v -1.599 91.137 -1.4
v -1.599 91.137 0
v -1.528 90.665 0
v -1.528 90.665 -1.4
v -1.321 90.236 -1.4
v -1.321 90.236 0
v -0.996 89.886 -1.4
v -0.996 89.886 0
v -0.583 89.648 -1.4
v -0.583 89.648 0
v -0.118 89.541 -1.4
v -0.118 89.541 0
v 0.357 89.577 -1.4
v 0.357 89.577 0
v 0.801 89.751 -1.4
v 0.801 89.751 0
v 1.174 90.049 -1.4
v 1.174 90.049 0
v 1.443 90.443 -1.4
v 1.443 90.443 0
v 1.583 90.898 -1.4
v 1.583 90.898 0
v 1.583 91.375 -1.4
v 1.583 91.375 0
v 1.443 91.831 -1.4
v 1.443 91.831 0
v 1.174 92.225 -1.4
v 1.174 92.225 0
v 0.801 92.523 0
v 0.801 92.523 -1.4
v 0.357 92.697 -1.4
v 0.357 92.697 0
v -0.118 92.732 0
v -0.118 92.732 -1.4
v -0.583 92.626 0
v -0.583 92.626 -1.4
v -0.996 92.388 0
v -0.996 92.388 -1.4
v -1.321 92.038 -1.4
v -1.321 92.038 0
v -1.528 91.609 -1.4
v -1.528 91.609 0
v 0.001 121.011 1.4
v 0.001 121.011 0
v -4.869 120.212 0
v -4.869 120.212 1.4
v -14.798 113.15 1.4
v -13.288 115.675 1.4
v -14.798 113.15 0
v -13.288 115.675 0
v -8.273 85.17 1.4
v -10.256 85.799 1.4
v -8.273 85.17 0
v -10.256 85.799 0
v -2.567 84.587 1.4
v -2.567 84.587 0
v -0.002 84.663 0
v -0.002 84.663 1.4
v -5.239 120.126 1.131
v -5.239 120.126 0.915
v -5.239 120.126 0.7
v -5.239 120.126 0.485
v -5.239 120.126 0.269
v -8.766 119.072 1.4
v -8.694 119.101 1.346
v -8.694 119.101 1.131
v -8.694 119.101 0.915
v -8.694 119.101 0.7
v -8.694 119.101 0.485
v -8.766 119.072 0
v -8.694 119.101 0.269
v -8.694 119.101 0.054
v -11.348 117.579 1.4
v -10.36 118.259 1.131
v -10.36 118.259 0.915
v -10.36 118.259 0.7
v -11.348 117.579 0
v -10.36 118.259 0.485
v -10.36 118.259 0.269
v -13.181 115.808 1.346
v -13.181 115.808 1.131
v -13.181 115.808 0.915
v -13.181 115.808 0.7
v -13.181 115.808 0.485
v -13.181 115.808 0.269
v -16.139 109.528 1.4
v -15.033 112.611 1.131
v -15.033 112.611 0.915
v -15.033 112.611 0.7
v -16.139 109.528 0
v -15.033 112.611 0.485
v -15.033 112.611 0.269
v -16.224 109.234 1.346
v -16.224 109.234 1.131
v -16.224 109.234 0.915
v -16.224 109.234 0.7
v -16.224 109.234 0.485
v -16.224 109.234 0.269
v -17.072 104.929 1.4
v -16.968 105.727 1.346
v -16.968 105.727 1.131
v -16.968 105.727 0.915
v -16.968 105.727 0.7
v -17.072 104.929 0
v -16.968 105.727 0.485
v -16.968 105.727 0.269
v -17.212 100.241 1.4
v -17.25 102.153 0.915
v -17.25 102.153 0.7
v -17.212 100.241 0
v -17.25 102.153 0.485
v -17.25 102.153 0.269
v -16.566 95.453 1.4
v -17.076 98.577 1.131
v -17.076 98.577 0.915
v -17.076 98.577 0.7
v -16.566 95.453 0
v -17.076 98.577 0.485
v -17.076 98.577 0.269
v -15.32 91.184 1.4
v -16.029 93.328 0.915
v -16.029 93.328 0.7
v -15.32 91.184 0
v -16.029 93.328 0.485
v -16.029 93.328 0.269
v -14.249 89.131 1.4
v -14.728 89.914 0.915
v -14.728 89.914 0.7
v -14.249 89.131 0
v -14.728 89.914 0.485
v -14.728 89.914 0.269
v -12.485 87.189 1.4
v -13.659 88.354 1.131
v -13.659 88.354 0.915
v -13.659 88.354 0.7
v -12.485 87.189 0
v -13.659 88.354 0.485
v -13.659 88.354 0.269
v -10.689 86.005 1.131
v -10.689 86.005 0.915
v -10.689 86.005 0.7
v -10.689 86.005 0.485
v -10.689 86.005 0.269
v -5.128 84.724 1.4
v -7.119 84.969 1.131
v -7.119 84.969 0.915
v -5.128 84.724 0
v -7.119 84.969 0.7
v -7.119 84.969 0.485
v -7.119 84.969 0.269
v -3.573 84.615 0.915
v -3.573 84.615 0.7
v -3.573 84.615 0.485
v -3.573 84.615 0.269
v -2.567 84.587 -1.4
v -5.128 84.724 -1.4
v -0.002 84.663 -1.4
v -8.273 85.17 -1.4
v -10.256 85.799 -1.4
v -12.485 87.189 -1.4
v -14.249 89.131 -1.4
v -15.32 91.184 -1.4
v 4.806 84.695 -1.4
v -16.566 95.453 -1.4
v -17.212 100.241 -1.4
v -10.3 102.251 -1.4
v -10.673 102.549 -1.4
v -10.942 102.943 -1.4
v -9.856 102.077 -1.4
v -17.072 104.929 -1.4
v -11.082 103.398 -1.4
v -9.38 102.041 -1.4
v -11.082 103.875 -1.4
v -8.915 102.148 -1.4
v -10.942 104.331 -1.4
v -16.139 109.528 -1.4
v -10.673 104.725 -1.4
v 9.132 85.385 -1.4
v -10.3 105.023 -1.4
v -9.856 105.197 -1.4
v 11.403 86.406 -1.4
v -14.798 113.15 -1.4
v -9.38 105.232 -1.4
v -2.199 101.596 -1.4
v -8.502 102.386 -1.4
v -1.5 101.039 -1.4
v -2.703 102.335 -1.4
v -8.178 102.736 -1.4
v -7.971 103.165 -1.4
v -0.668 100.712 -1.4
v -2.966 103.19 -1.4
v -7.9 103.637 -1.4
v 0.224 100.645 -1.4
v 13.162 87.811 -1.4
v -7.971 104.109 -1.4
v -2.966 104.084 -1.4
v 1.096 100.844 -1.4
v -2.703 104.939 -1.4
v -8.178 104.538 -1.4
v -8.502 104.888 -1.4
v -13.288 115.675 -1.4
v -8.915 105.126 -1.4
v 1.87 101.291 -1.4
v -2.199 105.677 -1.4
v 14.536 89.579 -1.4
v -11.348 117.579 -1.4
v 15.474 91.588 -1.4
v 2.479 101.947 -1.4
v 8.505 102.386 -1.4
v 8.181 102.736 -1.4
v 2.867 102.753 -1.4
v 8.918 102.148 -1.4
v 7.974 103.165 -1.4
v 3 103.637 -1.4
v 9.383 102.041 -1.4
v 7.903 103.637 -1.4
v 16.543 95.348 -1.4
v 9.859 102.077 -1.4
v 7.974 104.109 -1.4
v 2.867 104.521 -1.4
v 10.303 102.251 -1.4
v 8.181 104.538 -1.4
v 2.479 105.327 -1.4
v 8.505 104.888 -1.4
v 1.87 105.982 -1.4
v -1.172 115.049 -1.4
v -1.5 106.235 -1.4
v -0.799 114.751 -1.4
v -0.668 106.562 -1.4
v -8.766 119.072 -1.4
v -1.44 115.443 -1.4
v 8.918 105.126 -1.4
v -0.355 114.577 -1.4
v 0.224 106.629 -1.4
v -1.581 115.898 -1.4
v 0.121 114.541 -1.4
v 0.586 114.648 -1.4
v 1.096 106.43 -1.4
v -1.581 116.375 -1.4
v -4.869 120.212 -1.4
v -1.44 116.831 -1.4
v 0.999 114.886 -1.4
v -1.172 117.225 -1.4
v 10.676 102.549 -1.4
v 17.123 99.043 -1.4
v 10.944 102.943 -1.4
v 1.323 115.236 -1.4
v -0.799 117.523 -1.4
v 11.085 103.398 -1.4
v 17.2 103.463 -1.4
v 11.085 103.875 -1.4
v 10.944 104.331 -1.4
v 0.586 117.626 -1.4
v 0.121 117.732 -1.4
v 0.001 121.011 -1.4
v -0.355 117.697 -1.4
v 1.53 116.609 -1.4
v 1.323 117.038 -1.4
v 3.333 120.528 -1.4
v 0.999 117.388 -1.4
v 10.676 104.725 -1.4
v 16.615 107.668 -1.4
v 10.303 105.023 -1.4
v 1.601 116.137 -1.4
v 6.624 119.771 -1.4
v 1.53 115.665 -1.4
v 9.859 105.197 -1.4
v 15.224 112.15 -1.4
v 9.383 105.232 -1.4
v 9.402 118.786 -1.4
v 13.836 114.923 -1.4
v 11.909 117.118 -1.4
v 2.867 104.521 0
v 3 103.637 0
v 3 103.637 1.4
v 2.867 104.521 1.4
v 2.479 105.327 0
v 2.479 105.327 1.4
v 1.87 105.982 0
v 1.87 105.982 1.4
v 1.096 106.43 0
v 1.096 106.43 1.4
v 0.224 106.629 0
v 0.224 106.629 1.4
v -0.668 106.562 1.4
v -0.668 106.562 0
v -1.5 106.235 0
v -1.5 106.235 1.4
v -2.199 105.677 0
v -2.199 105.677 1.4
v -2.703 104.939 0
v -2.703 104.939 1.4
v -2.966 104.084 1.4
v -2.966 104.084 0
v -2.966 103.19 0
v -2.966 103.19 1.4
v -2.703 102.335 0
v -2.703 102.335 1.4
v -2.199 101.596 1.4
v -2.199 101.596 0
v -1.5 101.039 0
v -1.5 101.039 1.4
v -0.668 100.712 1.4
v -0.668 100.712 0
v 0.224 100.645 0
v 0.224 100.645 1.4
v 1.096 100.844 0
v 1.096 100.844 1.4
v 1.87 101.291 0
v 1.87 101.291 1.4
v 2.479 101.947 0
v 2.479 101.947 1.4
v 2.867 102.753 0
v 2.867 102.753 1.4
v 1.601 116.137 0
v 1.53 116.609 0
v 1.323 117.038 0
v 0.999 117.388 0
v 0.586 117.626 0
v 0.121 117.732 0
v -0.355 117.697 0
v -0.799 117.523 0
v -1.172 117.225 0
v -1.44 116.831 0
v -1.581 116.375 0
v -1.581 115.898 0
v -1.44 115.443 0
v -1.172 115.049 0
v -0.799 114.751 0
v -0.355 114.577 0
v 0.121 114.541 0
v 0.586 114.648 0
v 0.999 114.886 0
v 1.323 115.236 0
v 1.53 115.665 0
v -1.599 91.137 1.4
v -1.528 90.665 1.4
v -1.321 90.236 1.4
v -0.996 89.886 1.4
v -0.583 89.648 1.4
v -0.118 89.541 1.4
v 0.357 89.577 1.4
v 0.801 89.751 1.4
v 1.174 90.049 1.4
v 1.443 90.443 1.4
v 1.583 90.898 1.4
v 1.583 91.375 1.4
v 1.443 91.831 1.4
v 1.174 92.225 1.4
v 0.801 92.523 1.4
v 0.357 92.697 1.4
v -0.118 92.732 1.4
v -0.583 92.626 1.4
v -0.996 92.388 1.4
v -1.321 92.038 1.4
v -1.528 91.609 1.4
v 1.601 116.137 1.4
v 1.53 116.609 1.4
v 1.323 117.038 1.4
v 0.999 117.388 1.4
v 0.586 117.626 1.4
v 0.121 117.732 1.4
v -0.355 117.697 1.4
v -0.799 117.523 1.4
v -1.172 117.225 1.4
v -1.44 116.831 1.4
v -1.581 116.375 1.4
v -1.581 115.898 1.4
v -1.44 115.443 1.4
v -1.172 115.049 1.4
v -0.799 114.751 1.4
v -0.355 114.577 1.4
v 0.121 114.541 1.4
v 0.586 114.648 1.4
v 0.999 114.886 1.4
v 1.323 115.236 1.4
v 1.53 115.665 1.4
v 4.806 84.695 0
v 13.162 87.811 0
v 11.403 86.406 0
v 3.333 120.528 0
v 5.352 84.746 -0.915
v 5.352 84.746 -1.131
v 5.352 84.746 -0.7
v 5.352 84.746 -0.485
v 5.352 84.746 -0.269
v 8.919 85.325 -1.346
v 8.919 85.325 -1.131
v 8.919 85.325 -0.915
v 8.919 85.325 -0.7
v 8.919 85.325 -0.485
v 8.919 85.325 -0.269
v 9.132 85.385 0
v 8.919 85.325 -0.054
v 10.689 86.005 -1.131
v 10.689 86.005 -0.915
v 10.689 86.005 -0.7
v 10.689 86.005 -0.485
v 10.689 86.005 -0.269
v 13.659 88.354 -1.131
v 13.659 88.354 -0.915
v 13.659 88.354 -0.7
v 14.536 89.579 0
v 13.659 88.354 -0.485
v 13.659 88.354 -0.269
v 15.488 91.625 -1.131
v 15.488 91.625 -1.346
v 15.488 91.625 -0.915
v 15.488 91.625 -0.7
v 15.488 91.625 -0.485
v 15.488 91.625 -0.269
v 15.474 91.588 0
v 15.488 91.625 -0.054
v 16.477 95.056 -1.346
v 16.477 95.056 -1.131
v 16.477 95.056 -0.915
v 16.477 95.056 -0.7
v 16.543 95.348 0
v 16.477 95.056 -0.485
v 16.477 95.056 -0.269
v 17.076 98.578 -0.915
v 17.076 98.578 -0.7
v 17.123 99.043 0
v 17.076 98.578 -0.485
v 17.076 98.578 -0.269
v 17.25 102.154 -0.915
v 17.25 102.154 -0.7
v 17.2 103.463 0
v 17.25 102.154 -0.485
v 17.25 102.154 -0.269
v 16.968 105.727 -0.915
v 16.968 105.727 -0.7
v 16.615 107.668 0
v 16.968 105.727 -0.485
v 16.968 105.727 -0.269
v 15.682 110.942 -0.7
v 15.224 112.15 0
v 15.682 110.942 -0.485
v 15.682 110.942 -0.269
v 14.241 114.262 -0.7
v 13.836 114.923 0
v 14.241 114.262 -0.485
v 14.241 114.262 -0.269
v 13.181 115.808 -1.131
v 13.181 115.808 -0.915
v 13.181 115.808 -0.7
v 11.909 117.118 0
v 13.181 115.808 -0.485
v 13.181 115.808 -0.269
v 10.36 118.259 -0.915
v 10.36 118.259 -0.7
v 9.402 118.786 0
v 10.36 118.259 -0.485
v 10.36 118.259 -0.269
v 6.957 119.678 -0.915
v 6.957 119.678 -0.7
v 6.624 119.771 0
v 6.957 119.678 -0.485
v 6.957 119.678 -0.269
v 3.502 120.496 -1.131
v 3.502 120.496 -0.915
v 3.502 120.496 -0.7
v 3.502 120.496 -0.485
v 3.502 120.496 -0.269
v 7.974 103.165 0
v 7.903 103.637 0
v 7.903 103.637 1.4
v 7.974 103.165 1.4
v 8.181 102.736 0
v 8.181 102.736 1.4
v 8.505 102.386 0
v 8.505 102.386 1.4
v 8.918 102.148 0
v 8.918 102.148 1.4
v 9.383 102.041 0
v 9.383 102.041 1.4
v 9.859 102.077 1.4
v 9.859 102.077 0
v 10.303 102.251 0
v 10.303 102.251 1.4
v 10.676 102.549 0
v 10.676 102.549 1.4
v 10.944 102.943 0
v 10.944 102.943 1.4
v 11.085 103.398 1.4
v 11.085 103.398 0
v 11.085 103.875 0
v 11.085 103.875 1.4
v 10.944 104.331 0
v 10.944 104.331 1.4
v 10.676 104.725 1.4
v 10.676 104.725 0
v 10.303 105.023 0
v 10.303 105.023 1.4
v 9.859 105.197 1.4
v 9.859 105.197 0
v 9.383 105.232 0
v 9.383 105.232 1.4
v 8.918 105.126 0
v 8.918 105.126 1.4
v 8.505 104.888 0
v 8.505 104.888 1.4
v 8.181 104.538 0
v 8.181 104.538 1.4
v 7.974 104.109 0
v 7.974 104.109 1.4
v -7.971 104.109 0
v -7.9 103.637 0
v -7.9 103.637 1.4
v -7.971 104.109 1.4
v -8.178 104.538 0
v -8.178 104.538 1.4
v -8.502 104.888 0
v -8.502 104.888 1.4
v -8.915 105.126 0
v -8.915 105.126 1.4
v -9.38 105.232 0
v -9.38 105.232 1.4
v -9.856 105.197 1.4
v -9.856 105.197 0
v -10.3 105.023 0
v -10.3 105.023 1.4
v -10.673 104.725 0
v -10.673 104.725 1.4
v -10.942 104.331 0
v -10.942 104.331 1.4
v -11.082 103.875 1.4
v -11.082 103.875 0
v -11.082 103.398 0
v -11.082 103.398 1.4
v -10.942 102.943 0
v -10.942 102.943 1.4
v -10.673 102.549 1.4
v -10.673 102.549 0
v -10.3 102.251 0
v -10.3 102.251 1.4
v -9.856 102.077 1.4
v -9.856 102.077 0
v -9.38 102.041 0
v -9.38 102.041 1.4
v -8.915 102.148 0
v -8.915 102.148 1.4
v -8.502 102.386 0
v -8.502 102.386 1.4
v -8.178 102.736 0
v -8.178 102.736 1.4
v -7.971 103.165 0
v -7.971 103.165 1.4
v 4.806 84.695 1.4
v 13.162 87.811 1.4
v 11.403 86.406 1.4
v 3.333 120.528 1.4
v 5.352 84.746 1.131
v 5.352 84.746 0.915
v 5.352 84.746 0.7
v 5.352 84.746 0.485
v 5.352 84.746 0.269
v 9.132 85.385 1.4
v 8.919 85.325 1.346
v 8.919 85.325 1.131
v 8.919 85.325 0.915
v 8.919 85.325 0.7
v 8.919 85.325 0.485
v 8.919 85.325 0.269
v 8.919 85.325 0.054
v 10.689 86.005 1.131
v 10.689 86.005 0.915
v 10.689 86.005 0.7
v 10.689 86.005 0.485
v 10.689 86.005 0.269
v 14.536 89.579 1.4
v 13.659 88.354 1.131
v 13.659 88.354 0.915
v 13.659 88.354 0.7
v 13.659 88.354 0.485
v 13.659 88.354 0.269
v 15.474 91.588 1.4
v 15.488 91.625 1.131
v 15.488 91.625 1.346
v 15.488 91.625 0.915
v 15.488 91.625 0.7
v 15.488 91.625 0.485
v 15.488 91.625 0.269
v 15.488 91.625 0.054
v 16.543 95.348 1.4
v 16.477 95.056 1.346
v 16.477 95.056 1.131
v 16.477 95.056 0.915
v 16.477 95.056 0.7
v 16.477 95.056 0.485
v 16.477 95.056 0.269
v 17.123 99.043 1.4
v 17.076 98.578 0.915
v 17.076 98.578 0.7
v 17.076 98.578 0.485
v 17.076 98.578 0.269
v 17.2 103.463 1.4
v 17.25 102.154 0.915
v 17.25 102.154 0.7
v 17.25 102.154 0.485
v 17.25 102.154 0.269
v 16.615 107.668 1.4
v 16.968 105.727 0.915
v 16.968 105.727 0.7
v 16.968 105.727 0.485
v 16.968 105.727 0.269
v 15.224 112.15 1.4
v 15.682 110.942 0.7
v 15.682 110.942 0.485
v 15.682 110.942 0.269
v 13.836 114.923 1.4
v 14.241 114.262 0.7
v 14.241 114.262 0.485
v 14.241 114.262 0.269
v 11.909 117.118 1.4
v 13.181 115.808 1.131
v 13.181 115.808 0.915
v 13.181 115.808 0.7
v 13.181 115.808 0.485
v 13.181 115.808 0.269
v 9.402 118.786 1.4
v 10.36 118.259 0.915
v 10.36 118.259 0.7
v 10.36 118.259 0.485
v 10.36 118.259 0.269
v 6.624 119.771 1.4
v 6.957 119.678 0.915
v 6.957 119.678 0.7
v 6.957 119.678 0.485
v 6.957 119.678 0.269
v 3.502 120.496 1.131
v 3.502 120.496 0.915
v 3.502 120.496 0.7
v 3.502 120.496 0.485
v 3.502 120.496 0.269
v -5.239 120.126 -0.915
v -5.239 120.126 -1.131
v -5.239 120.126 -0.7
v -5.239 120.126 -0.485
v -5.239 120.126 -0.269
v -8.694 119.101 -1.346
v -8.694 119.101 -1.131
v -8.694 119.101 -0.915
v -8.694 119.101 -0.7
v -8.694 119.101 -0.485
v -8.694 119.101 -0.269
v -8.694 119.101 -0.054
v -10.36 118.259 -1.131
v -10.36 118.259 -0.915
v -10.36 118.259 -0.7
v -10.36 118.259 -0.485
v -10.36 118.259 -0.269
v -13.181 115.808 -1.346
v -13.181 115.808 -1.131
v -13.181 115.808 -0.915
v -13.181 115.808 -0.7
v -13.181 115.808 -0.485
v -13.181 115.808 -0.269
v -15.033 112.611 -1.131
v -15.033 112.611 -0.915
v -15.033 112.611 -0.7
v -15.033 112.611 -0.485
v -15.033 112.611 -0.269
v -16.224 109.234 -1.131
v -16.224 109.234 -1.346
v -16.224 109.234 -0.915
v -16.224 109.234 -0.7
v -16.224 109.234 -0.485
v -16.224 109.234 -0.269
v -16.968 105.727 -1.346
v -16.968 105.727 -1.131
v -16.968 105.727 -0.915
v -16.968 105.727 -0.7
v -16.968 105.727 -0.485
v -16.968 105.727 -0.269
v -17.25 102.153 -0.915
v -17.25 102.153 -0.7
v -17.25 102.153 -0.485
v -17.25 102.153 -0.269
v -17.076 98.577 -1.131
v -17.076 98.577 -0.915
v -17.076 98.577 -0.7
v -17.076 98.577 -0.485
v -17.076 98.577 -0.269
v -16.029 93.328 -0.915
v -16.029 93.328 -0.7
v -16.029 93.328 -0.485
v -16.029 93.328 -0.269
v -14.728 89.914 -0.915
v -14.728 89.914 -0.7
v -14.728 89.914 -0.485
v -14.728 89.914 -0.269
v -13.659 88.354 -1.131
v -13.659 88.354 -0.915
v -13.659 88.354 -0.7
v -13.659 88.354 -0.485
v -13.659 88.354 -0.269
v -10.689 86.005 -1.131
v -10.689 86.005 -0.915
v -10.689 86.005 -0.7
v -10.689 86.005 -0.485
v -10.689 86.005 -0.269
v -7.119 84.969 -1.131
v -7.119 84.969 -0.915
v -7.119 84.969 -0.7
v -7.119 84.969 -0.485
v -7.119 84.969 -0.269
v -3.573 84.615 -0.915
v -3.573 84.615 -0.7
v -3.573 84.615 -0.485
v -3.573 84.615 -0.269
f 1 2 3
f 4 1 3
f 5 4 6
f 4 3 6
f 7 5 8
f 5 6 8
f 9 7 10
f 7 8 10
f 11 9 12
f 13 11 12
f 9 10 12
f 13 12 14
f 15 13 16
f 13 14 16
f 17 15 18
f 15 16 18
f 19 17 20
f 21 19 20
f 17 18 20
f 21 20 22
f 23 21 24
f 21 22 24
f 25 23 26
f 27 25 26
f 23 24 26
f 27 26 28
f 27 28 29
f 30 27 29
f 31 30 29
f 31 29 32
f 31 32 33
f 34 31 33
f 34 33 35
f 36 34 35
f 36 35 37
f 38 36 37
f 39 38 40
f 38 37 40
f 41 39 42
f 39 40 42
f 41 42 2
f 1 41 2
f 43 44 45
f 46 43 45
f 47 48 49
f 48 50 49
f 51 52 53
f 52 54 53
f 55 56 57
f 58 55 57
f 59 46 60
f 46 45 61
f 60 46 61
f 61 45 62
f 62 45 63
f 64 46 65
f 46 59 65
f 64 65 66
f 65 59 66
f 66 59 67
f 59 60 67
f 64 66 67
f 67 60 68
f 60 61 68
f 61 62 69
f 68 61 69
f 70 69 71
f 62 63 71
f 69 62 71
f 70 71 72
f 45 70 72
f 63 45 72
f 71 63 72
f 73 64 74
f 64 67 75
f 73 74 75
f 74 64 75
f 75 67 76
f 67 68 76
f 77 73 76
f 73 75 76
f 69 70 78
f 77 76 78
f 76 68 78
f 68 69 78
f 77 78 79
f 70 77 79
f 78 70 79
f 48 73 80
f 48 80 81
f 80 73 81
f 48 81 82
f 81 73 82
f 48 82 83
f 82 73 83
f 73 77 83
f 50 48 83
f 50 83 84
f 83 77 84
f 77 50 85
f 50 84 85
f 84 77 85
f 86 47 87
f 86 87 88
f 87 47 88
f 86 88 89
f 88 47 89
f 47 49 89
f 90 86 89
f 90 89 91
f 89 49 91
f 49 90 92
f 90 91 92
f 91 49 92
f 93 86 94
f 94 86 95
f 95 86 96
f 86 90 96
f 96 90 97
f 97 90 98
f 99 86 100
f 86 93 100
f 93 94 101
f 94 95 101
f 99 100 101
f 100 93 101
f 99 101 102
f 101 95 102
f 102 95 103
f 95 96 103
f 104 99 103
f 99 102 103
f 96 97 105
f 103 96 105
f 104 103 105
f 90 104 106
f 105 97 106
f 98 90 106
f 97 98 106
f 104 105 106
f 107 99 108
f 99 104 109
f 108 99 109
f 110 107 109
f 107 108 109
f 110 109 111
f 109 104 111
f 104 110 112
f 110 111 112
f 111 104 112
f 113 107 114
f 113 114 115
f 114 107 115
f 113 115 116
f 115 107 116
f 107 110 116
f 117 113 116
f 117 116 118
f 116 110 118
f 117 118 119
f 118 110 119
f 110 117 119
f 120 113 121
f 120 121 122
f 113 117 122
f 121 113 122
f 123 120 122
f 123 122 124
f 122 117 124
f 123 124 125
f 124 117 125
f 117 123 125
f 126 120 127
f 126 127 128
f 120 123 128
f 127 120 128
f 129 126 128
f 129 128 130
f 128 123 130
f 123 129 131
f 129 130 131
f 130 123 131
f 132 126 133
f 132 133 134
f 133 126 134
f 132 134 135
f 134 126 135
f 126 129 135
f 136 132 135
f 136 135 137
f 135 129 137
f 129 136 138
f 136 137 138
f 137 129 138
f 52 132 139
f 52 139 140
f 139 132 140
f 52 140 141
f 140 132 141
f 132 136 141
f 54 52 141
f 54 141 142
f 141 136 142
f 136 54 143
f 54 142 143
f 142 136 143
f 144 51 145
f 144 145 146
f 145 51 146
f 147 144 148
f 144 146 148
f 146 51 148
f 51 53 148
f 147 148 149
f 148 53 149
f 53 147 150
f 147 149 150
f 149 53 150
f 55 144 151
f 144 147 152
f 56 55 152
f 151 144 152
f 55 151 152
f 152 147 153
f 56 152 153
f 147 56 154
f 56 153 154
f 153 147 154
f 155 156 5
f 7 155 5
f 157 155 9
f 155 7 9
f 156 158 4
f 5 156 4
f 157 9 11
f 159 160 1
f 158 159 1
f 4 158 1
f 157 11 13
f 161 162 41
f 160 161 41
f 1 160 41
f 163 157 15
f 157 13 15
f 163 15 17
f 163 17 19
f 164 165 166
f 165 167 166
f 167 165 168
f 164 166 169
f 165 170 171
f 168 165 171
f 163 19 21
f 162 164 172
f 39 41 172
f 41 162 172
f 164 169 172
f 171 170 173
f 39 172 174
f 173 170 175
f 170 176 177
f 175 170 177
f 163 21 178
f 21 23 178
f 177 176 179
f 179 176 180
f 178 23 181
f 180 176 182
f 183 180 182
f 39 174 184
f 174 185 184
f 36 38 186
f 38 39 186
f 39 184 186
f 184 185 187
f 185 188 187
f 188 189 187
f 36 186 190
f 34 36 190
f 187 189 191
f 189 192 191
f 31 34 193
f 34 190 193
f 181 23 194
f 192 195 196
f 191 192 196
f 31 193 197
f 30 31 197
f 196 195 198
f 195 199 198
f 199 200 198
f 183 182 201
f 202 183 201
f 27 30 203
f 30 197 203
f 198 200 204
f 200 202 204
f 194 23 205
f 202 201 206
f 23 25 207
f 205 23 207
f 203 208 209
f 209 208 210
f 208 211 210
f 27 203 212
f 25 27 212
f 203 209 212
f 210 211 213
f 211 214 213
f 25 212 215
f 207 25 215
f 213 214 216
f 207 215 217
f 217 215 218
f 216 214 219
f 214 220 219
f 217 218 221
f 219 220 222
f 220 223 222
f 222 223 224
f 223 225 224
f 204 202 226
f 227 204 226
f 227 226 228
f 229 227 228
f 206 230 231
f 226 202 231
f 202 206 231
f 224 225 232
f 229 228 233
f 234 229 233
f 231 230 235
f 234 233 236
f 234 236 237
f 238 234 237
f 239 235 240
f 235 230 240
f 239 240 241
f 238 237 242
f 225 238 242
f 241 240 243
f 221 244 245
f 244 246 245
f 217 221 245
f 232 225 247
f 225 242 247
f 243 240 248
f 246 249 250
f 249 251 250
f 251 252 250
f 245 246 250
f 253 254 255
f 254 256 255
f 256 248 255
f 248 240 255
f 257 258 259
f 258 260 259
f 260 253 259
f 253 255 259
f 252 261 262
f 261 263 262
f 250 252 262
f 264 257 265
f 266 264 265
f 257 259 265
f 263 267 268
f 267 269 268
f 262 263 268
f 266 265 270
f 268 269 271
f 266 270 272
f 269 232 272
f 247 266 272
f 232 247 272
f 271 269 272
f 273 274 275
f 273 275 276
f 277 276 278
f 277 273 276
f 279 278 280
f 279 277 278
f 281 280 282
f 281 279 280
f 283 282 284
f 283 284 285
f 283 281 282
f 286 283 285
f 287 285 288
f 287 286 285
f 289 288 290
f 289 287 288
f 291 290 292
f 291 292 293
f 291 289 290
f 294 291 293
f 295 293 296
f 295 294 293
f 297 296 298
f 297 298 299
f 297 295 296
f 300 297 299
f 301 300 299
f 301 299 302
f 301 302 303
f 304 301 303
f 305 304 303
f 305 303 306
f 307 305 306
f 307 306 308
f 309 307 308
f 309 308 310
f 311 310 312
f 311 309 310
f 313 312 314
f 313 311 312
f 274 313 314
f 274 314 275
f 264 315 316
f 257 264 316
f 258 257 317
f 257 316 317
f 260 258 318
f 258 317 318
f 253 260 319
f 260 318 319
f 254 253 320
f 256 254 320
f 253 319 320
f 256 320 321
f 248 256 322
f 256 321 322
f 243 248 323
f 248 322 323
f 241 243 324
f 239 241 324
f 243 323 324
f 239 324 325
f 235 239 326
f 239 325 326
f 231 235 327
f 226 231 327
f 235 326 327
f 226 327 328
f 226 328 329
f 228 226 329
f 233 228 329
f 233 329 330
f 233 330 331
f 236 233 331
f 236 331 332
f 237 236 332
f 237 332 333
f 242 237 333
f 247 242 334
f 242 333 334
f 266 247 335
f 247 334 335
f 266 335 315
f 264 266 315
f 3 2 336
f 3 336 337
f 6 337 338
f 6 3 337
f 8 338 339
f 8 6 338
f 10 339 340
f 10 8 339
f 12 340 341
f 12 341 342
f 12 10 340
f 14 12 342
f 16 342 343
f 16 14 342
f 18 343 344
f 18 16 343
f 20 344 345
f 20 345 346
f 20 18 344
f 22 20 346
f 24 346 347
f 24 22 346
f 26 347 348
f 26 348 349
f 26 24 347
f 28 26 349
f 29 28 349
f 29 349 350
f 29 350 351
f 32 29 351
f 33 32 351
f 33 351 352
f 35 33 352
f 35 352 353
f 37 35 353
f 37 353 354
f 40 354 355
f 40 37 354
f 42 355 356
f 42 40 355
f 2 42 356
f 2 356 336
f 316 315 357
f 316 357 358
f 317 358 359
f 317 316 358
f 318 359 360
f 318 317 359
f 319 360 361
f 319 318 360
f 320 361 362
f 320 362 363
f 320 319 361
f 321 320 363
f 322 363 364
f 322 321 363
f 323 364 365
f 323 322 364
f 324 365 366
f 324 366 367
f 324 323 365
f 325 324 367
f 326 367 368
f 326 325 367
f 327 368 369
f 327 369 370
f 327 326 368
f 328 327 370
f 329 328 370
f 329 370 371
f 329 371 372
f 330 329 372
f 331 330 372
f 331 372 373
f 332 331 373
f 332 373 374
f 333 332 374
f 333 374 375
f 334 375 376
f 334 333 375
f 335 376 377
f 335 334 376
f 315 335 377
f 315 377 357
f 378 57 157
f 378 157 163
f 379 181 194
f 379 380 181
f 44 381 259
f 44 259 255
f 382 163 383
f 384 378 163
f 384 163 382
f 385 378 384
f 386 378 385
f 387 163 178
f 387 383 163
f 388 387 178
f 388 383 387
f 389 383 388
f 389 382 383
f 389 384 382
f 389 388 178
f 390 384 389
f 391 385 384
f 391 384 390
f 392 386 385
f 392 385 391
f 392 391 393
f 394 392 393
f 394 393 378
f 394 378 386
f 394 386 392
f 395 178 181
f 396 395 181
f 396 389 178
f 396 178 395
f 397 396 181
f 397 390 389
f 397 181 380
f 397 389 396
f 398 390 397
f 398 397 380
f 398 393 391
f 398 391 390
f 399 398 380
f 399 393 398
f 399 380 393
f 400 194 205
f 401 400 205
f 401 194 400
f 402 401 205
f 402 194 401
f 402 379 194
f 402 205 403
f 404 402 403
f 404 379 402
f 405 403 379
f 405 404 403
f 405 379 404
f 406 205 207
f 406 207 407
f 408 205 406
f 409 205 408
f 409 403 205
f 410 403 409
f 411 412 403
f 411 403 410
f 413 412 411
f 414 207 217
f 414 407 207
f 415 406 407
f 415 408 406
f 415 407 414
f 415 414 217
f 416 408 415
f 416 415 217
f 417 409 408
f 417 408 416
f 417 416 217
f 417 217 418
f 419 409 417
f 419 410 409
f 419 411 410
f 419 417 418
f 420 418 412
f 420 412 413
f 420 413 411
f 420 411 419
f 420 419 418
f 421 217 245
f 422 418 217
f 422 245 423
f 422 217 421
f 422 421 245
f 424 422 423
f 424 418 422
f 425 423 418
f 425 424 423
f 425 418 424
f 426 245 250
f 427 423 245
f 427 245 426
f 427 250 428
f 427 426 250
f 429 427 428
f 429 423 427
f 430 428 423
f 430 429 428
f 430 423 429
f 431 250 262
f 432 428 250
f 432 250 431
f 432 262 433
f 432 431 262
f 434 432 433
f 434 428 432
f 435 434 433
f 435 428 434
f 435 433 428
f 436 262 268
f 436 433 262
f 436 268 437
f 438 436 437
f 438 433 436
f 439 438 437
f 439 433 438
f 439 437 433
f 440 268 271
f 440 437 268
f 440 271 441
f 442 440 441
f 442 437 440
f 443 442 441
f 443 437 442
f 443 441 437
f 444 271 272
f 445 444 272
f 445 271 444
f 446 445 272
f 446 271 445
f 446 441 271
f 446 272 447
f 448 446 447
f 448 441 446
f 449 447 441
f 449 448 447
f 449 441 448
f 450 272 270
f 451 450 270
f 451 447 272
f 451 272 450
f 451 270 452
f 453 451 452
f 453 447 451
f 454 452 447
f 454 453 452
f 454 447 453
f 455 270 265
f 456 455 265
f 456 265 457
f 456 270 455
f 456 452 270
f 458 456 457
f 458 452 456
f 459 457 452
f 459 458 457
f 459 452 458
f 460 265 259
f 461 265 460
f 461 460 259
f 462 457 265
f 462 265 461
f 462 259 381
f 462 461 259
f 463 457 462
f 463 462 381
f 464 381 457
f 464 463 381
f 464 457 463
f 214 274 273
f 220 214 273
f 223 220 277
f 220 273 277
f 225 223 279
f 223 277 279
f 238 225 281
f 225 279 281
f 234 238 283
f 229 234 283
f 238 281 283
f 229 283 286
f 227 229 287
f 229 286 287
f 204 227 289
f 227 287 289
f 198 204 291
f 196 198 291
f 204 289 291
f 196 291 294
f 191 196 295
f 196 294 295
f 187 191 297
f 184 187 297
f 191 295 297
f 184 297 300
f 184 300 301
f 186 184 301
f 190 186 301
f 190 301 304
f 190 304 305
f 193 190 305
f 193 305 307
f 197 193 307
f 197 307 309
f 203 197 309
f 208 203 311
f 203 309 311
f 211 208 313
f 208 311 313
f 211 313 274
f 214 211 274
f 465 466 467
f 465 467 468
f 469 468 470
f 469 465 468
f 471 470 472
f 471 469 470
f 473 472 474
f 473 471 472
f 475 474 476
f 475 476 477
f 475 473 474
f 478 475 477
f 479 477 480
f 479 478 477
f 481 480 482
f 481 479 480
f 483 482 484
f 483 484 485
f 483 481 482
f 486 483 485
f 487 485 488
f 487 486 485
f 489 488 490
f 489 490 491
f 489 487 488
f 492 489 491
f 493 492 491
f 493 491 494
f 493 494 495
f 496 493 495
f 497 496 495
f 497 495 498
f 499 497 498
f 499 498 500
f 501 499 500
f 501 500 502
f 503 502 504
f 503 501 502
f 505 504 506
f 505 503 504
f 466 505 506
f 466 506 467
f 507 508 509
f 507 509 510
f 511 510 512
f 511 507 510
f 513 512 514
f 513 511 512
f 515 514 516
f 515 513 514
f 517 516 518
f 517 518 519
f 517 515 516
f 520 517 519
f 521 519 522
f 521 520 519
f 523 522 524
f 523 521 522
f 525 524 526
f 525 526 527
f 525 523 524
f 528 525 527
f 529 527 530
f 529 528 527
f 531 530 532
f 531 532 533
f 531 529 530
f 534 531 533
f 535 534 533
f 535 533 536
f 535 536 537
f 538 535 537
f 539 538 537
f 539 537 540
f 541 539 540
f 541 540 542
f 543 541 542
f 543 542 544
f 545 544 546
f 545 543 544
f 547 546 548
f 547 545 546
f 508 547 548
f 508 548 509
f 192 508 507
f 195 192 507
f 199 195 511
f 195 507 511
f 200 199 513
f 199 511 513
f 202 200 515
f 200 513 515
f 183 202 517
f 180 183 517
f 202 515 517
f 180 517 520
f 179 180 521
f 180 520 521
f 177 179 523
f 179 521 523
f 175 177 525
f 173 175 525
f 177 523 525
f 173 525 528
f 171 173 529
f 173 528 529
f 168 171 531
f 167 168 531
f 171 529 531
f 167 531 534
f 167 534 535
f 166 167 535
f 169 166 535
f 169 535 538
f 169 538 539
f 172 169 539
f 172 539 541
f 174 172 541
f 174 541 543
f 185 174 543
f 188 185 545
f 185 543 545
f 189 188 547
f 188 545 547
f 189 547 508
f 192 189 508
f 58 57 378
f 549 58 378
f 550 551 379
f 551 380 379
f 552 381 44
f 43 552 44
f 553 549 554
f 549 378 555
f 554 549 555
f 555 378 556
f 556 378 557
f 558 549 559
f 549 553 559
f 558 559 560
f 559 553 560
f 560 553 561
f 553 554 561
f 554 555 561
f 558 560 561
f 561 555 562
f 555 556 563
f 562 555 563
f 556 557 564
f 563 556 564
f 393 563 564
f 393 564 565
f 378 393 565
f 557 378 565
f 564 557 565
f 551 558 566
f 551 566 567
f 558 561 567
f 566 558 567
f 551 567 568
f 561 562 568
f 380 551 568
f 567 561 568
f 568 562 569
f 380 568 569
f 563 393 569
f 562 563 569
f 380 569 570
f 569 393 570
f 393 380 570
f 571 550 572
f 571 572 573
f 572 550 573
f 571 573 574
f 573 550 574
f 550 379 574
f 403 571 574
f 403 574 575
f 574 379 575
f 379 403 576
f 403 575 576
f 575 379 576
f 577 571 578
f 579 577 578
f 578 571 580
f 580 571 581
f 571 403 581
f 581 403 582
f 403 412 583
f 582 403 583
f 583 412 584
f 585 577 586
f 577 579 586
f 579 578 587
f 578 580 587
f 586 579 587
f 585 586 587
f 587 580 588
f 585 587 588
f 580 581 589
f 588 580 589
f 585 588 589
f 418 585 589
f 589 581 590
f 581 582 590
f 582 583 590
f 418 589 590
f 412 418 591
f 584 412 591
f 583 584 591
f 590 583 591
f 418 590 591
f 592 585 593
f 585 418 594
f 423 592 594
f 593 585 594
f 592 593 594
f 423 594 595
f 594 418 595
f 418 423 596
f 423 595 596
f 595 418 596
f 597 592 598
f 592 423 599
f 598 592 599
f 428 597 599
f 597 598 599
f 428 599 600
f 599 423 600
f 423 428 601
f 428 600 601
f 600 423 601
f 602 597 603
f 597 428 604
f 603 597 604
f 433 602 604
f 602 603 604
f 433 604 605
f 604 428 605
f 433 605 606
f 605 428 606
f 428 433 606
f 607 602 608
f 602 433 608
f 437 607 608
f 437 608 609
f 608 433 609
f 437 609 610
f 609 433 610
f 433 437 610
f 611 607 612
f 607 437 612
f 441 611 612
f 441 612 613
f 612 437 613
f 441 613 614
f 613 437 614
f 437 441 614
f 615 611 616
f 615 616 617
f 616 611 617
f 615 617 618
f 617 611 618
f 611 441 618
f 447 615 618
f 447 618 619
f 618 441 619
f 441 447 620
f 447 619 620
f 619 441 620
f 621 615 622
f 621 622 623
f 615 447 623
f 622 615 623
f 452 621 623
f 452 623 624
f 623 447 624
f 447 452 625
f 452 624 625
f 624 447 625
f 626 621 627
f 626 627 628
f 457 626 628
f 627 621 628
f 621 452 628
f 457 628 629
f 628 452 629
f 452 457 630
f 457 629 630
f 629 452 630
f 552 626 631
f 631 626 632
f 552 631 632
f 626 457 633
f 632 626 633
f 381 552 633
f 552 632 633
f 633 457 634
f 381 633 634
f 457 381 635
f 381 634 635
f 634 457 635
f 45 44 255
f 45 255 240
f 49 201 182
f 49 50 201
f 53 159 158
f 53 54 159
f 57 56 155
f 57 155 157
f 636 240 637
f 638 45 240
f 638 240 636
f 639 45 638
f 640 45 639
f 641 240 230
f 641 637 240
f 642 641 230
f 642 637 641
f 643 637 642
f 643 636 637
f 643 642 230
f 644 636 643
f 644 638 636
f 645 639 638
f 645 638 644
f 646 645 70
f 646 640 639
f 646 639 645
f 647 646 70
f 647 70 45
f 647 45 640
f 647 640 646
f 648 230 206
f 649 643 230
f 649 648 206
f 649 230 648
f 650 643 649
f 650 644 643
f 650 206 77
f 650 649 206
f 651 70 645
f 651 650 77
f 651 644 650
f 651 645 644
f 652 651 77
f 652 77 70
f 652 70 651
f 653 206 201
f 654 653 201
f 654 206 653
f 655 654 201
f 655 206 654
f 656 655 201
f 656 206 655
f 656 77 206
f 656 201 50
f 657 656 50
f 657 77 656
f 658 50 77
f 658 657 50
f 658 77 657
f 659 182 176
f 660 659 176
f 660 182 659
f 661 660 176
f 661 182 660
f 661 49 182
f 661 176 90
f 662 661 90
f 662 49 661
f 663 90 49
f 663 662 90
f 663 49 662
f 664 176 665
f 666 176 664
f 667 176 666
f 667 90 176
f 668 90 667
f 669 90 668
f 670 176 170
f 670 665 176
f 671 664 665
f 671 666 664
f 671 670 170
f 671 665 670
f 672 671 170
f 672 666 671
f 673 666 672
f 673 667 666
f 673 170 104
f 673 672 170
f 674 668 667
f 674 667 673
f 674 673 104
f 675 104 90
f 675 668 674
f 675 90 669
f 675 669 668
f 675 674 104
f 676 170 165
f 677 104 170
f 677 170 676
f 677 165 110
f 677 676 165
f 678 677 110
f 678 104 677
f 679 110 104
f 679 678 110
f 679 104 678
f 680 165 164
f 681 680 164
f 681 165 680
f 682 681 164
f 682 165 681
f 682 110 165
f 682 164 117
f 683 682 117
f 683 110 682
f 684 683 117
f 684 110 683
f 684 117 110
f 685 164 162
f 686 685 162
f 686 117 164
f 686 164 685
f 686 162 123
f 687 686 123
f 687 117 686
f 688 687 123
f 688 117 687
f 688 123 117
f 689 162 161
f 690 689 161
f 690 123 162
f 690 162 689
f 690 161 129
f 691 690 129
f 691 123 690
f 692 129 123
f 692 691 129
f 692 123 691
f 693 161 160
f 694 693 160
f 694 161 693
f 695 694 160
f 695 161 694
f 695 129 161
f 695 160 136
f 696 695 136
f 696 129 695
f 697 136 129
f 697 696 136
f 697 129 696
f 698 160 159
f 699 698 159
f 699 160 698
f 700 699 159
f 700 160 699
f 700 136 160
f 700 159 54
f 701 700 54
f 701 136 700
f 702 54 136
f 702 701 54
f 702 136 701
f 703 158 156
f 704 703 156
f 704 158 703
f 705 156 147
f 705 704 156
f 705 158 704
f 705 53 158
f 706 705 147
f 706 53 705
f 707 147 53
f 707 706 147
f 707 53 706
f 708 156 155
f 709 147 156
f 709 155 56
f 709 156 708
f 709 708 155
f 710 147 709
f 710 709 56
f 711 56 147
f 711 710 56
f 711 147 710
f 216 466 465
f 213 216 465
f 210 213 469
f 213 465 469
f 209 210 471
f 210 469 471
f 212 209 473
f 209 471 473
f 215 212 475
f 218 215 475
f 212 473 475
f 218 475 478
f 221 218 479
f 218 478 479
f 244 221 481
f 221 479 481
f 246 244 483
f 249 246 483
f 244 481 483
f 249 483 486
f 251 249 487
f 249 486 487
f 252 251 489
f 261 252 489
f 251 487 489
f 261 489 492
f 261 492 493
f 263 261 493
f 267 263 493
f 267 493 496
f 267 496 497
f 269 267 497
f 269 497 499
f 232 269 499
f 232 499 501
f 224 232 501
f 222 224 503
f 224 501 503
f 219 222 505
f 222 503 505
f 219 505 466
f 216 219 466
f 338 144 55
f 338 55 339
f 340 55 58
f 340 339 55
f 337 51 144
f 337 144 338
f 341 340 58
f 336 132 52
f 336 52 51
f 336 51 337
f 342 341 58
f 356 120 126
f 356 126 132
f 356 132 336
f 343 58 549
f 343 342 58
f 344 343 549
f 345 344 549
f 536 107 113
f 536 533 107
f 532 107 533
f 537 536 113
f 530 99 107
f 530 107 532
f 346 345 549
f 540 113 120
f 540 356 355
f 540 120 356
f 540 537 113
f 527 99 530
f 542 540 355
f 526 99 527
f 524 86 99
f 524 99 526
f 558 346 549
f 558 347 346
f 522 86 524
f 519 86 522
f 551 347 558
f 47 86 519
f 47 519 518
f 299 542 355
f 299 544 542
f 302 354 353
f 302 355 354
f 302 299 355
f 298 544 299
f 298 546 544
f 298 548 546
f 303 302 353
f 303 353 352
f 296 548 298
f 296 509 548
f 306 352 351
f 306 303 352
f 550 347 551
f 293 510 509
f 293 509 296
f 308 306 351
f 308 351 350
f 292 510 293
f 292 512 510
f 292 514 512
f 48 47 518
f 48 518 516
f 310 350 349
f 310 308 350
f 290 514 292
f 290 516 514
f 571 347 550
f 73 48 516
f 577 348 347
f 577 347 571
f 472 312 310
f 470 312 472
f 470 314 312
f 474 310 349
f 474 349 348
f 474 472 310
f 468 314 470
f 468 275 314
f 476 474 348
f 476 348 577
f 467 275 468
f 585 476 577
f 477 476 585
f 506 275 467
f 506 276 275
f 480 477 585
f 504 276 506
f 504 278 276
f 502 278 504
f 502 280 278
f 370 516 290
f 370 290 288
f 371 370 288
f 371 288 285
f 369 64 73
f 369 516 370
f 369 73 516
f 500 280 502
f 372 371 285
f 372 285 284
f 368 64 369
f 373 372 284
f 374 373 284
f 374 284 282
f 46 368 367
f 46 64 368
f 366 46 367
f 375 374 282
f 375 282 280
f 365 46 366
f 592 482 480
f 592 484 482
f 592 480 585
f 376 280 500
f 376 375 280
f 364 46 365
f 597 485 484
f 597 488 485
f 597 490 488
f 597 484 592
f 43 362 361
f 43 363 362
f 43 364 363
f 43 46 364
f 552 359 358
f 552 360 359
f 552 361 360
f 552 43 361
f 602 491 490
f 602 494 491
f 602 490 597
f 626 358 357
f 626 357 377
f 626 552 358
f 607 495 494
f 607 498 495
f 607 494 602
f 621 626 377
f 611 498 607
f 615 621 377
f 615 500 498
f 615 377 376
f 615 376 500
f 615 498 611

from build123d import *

# Parameters (mm, degrees)
SKETCH_1_R      = 3
SKETCH_1_R_2    = 1.6
EXTRUDE_1_DEPTH = 1.4


with BuildPart() as part:
    # Эскиз1 → Бобышка-Вытянуть1 (new, symmetric)
    with BuildSketch(Plane.XY):
        with BuildLine():
            add(Edge.make_bspline(
                [(0.001122719, 121.010798342), (-1.171537777, 120.878564334), (-2.920342404, 120.635017485), (-5.247011767, 120.138030638), (-6.946800778, 119.69382144), (-8.706962648, 119.152836869), (-10.946545964, 118.020539751), (-12.866852389, 116.358462009), (-14.110408646, 114.55076963), (-14.679815244, 113.428374891), (-15.154527423, 112.342274587), (-15.700764451, 110.9480002), (-16.422748754, 108.670349078), (-17.04602107, 105.737371487), (-17.32644385, 102.153144608), (-17.145523196, 98.567099912), (-16.645918818, 95.628814641), (-16.039061045, 93.319797301), (-15.5260557, 91.634852262), (-14.783897478, 89.88389692), (-13.350969306, 87.790887142), (-11.309708093, 86.171801095), (-9.23376402, 85.37848751), (-7.992173717, 85.10397433), (-6.829329308, 84.920254061), (-5.352810016, 84.730108117), (-2.981055745, 84.55218118), (-1.18943239, 84.580698193), (-0.001948516, 84.662753882)],
                knots=[-0.001640955, -0.001640955, -0.001640955, -0.001640955, 0.060897345, 0.092166496, 0.123435646, 0.154704796, 0.185973946, 0.248512247, 0.279781397, 0.295415973, 0.311050548, 0.342319698, 0.373588848, 0.436127149, 0.49866545, 0.56120375, 0.623742051, 0.655011201, 0.686280351, 0.717549502, 0.748818652, 0.811356953, 0.842626103, 0.858260678, 0.873895253, 0.905164404, 0.936433554, 0.998971855, 0.998971855, 0.998971855, 0.998971855], degree=3))
            add(Edge.make_bspline(
                [(-0.001948516, 84.662753882), (1.186405897, 84.574913724), (2.981520197, 84.553409912), (5.352882576, 84.72996369), (6.828933856, 84.920007559), (7.992486819, 85.10432361), (9.233850055, 85.378281966), (11.309773393, 86.171966045), (13.351203758, 87.791458364), (14.783942442, 89.883427402), (15.526120315, 91.636895952), (16.039409913, 93.320656443), (16.646093116, 95.630029551), (17.145598213, 98.567887787), (17.326583953, 102.154340228), (17.045346777, 105.738581877), (16.423176495, 108.669286984), (15.700645475, 110.947823695), (15.155239529, 112.341634894), (14.679791368, 113.42724638), (14.110834256, 114.550989633), (12.866935438, 116.357789729), (10.94687662, 118.02057599), (8.706999484, 119.152590802), (6.947014559, 119.693958367), (5.246499604, 120.138050756), (2.920641381, 120.635596611), (1.17271692, 120.875374778), (0.001122719, 121.010798342)],
                knots=[0.001027229, 0.001027229, 0.001027229, 0.001027229, 0.063565581, 0.094834756, 0.126103932, 0.14173852, 0.157373108, 0.188642284, 0.251180635, 0.282449811, 0.313718987, 0.344988162, 0.376257338, 0.438795689, 0.501334041, 0.563872392, 0.626410744, 0.657679919, 0.688949095, 0.704583683, 0.720218271, 0.751487447, 0.814025798, 0.845294974, 0.87656415, 0.907833325, 0.939102501, 1.001640852, 1.001640852, 1.001640852, 1.001640852], degree=3))
        make_face()
        with Locations((0, 103.636945021)):
            Circle(SKETCH_1_R, mode=Mode.SUBTRACT)
        with Locations((0.001338806, 116.136944949)):
            Circle(SKETCH_1_R_2, mode=Mode.SUBTRACT)
        with Locations((-9.5, 103.636945021)):
            Circle(SKETCH_1_R_2, mode=Mode.SUBTRACT)
        with Locations(Location((0.001338806, 91.136945092, 0), (0, 0, 180))):
            Circle(SKETCH_1_R_2, mode=Mode.SUBTRACT)
        with Locations(Location((9.502677611, 103.636945021, 0), (0, 0, 180))):
            Circle(SKETCH_1_R_2, mode=Mode.SUBTRACT)
    extrude(amount=EXTRUDE_1_DEPTH, both=True)


solid = part.part
